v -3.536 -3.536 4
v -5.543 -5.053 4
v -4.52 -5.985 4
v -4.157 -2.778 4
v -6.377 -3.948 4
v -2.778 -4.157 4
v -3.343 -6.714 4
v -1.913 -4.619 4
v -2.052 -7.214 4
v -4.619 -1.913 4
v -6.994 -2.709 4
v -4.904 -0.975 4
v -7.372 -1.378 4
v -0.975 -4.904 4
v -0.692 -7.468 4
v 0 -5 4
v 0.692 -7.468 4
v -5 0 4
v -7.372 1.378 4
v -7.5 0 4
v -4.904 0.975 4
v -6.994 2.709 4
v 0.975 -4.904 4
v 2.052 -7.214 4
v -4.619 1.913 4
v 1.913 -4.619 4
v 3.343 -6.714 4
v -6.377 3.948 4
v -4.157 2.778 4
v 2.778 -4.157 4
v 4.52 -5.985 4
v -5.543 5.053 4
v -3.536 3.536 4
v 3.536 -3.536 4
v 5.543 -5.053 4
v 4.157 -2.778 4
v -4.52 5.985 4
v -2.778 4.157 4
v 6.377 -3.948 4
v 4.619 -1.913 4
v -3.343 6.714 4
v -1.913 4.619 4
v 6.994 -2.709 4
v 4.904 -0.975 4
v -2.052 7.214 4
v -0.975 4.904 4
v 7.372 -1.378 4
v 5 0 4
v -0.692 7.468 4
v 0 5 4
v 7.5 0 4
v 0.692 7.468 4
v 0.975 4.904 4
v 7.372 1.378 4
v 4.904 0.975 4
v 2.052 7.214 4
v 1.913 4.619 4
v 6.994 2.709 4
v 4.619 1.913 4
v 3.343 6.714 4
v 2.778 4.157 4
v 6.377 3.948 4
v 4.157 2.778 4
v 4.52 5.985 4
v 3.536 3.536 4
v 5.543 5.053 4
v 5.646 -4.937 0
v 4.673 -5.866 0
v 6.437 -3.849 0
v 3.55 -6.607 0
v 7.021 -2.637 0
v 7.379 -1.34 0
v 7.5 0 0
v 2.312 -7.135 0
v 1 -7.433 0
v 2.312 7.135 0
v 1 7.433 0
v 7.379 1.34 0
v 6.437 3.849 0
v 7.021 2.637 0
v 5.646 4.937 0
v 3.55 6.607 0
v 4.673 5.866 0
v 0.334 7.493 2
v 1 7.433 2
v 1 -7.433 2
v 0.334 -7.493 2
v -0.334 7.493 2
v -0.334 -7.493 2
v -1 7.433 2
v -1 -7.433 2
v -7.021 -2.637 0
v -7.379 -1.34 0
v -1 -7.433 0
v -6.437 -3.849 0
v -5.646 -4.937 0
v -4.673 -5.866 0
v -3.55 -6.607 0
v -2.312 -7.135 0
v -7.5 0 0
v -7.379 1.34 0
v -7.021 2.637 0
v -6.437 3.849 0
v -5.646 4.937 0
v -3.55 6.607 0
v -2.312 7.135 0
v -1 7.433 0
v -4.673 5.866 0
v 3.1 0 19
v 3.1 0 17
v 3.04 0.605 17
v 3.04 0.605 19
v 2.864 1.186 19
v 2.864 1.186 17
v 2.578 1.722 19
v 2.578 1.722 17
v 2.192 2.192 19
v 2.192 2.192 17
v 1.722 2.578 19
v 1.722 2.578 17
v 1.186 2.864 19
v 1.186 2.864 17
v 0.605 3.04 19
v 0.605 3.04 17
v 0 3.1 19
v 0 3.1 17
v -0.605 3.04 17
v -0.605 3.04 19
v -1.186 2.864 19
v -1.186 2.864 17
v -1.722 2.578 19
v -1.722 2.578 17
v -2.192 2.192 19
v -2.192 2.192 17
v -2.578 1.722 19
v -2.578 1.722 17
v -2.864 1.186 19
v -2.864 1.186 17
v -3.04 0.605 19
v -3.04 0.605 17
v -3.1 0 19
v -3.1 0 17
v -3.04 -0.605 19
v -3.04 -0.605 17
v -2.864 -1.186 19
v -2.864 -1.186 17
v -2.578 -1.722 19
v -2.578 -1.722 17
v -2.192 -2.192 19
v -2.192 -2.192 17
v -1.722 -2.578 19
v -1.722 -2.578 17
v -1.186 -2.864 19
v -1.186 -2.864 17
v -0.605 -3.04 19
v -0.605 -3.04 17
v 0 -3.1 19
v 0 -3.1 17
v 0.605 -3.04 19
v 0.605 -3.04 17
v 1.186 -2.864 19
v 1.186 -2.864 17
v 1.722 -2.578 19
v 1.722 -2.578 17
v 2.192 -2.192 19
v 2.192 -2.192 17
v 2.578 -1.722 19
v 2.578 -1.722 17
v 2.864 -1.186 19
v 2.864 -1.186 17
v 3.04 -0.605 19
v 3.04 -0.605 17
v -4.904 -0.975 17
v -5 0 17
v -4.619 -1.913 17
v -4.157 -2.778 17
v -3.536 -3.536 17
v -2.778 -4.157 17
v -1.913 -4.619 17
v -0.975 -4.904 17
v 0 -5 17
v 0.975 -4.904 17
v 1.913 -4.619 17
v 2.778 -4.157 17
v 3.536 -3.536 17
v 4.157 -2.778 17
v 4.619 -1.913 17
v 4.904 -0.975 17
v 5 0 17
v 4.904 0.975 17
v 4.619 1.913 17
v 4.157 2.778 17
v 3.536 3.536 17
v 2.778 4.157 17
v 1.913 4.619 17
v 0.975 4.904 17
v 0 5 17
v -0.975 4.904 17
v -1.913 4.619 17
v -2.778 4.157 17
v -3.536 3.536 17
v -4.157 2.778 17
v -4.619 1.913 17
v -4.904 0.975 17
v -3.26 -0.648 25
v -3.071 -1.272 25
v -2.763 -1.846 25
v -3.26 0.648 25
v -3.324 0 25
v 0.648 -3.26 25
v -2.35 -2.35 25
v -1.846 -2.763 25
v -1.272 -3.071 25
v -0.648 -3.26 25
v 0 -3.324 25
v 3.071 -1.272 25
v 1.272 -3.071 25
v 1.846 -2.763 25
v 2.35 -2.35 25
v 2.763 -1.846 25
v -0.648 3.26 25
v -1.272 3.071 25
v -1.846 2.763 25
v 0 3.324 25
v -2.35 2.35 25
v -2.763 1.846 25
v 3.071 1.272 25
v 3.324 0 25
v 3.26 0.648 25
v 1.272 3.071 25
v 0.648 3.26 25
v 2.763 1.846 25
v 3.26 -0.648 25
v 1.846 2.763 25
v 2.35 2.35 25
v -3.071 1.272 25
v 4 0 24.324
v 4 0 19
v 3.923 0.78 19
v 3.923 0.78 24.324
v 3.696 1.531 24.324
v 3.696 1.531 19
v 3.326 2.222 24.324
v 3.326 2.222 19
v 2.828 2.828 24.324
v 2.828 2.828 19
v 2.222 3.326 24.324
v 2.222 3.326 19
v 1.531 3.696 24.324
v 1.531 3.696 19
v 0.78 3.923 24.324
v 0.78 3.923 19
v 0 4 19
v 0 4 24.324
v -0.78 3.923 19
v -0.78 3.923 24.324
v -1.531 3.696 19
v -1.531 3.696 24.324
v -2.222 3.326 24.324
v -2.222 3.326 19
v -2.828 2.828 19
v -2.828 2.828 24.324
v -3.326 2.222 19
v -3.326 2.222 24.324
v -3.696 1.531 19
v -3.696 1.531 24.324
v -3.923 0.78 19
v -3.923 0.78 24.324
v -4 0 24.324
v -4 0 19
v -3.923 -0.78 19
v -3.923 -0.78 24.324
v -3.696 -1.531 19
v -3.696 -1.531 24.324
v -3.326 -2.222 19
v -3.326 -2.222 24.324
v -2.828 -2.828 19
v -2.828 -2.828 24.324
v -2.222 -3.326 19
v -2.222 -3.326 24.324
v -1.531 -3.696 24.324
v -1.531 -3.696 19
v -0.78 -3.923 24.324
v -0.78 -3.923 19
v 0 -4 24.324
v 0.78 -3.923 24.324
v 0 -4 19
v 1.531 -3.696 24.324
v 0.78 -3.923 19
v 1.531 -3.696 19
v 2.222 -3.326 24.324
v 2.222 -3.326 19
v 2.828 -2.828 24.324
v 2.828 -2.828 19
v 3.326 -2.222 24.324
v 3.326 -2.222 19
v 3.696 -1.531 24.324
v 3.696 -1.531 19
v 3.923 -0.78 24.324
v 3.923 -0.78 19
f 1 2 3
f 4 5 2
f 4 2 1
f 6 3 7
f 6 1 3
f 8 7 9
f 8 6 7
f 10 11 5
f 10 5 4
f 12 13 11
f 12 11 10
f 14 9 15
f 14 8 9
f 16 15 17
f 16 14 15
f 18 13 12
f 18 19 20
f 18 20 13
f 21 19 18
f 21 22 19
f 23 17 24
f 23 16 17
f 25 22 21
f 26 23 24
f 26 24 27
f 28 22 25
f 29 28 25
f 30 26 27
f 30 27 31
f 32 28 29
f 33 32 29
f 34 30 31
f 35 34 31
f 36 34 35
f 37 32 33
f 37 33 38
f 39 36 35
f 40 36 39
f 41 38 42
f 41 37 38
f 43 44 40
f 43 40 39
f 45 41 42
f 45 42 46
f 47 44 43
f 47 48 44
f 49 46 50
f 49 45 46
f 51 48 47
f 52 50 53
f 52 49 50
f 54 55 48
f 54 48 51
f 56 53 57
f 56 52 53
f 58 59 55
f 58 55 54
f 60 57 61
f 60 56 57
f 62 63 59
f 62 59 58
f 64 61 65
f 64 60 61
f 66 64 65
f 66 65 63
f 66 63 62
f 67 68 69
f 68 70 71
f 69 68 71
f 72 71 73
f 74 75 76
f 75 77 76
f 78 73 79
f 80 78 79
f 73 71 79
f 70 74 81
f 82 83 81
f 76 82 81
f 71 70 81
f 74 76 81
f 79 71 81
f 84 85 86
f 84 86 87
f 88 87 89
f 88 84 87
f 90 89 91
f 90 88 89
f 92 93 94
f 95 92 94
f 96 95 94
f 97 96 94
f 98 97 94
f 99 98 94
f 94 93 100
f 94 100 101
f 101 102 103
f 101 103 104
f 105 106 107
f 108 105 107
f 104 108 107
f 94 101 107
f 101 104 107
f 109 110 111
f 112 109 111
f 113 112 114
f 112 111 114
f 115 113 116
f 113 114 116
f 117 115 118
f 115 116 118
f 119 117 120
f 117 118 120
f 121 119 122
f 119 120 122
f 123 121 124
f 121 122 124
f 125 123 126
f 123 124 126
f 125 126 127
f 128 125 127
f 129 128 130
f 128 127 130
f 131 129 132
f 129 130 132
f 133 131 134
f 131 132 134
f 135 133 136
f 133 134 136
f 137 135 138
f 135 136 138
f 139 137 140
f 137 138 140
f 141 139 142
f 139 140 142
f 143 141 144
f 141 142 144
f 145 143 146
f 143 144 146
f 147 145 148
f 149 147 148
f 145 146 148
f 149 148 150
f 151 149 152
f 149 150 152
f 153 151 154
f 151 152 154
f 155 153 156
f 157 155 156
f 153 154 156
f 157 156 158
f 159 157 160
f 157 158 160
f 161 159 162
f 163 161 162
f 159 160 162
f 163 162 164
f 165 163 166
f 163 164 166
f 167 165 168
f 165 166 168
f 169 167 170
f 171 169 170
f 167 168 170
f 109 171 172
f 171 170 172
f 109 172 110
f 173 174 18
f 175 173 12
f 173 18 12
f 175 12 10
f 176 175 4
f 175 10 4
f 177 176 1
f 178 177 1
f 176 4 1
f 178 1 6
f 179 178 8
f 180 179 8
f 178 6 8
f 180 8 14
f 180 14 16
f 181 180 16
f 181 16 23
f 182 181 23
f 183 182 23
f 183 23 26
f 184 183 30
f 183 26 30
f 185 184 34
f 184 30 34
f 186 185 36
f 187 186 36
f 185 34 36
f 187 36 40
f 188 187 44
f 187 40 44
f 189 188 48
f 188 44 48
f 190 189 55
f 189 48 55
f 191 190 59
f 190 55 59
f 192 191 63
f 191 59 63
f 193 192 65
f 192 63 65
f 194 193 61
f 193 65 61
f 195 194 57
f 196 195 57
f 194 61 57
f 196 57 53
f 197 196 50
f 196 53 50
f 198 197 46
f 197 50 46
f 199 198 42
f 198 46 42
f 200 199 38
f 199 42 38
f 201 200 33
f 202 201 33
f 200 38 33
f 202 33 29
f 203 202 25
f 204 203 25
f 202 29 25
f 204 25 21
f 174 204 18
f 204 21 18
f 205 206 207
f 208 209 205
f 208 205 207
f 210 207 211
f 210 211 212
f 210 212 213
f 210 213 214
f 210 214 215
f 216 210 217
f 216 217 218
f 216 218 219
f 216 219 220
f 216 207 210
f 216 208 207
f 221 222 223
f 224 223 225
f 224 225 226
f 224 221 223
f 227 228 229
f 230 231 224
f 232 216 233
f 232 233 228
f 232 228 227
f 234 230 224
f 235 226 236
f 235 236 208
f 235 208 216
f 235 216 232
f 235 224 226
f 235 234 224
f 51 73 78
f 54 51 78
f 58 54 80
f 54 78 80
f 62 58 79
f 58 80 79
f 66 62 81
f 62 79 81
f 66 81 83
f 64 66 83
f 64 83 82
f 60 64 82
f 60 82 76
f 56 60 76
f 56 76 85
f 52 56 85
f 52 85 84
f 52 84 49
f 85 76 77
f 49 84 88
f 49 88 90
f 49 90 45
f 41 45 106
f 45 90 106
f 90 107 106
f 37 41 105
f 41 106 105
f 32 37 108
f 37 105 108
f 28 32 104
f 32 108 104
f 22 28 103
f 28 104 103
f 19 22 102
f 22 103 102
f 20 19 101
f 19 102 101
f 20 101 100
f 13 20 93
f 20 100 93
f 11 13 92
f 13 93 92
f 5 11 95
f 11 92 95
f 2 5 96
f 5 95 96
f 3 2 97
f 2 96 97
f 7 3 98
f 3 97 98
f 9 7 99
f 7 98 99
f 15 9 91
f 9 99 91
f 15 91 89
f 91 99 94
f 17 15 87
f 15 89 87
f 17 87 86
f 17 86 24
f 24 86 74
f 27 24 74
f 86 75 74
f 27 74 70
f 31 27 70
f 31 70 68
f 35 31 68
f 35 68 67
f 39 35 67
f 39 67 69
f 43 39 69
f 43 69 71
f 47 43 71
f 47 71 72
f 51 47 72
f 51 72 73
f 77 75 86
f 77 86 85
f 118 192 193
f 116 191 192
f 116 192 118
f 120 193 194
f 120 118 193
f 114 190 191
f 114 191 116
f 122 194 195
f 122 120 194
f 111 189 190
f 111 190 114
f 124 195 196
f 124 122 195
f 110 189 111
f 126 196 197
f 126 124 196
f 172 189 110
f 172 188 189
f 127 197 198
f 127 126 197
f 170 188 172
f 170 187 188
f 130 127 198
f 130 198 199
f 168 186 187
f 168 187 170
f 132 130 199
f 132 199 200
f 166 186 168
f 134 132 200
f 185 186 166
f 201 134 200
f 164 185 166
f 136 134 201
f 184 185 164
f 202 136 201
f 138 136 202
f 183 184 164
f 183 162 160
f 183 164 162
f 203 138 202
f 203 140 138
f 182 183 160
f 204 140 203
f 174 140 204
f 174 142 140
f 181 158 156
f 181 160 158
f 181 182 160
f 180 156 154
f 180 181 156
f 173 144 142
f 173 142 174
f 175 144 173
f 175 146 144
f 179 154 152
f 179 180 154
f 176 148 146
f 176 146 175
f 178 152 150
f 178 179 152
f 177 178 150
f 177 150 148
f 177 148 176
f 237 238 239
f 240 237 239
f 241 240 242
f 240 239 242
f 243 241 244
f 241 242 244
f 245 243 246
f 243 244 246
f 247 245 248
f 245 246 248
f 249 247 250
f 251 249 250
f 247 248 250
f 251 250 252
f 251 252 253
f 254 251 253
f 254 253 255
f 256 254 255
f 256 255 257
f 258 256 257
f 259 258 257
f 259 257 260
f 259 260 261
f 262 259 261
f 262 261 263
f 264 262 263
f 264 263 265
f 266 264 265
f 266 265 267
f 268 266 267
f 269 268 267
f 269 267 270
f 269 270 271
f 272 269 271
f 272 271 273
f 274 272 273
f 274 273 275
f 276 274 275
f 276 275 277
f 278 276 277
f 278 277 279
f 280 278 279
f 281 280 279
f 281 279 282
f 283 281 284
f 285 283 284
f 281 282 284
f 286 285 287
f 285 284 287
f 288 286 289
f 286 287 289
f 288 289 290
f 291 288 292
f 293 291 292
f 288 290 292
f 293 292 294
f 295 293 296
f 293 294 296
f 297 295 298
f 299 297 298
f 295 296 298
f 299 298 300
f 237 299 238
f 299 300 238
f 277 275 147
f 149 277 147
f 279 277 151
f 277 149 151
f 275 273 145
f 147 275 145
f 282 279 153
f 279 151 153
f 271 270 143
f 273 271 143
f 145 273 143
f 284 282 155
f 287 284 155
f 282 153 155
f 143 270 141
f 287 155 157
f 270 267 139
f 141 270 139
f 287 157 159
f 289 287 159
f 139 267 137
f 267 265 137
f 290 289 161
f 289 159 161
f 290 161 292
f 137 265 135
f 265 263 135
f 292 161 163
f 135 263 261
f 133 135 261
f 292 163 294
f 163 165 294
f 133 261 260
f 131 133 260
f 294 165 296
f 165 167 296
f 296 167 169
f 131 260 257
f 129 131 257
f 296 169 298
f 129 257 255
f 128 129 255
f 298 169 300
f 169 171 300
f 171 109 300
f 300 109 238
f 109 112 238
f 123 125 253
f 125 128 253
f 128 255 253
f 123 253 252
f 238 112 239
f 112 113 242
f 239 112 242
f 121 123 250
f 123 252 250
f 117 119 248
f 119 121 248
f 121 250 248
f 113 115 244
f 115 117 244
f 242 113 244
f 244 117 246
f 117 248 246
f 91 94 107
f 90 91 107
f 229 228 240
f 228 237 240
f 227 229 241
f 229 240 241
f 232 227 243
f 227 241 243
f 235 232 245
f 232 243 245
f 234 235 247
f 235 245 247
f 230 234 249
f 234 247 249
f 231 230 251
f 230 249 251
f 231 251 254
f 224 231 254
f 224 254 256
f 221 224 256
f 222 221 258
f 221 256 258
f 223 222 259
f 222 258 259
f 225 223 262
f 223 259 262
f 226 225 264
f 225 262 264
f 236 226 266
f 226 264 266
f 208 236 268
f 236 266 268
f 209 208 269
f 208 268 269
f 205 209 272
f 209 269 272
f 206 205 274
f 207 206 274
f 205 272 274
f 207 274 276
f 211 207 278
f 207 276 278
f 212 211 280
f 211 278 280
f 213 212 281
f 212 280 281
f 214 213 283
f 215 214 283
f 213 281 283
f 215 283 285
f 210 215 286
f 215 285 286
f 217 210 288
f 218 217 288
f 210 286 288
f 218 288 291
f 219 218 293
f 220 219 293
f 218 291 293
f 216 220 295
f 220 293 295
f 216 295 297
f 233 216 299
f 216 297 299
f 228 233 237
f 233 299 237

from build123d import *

# Parameters (mm, degrees)
SKETCH_1_R          = 7.5
EXTRUDE_1_DEPTH     = 4
SKETCH_2_R          = 5
EXTRUDE_2_DEPTH     = 13
SKETCH_3_R          = 3.1
EXTRUDE_3_DEPTH     = 2
SKETCH_4_R          = 4
EXTRUDE_4_DEPTH     = 6
SKETCH_6_W          = 2
SKETCH_6_H          = 15.894764062
CUT_EXTRUDE_2_DEPTH = 2


# Read off the part's stored shape, not the designer's step: M8 机械螺纹 螺柱1
with BuildPart() as part:
    # 草图1 → 凸台-拉伸1 (new body)
    with BuildSketch(Plane.XY):
        Circle(SKETCH_1_R)
    extrude(amount=EXTRUDE_1_DEPTH)

    # 草图2 → 凸台-拉伸2 (add)
    with BuildSketch(Plane.XY.offset(4)):
        with Locations(Location((0, 0, 0), (0, 0, 180))):
            Circle(SKETCH_2_R)
    extrude(amount=EXTRUDE_2_DEPTH)

    # 草图3 → 凸台-拉伸3 (add)
    with BuildSketch(Plane.XY.offset(17)):
        Circle(SKETCH_3_R)
    extrude(amount=EXTRUDE_3_DEPTH)

    # 草图4 → 凸台-拉伸4 (add)
    with BuildSketch(Plane.XY.offset(19)):
        Circle(SKETCH_4_R)
    extrude(amount=EXTRUDE_4_DEPTH)

    # M8 机械螺纹 螺柱1 outline → M8 机械螺纹 螺柱1 (revolve, cut)
    with BuildSketch(Plane.XZ):
        Polygon((4, 25), (3.3235, 25), (4, 24.3235), align=None)
    revolve(axis=Axis((0, 0, 0), (0, 0, 1)), mode=Mode.SUBTRACT)

    # 草图6 → 切除-拉伸-薄壁2 (cut)
    with BuildSketch(Plane(origin=(0, 0, 0), x_dir=(-1, 0, 0), z_dir=(0, 0, -1))):
        with Locations((0, 0.006874898)):
            Rectangle(SKETCH_6_W, SKETCH_6_H)
    extrude(amount=-CUT_EXTRUDE_2_DEPTH, mode=Mode.SUBTRACT)


solid = part.part
